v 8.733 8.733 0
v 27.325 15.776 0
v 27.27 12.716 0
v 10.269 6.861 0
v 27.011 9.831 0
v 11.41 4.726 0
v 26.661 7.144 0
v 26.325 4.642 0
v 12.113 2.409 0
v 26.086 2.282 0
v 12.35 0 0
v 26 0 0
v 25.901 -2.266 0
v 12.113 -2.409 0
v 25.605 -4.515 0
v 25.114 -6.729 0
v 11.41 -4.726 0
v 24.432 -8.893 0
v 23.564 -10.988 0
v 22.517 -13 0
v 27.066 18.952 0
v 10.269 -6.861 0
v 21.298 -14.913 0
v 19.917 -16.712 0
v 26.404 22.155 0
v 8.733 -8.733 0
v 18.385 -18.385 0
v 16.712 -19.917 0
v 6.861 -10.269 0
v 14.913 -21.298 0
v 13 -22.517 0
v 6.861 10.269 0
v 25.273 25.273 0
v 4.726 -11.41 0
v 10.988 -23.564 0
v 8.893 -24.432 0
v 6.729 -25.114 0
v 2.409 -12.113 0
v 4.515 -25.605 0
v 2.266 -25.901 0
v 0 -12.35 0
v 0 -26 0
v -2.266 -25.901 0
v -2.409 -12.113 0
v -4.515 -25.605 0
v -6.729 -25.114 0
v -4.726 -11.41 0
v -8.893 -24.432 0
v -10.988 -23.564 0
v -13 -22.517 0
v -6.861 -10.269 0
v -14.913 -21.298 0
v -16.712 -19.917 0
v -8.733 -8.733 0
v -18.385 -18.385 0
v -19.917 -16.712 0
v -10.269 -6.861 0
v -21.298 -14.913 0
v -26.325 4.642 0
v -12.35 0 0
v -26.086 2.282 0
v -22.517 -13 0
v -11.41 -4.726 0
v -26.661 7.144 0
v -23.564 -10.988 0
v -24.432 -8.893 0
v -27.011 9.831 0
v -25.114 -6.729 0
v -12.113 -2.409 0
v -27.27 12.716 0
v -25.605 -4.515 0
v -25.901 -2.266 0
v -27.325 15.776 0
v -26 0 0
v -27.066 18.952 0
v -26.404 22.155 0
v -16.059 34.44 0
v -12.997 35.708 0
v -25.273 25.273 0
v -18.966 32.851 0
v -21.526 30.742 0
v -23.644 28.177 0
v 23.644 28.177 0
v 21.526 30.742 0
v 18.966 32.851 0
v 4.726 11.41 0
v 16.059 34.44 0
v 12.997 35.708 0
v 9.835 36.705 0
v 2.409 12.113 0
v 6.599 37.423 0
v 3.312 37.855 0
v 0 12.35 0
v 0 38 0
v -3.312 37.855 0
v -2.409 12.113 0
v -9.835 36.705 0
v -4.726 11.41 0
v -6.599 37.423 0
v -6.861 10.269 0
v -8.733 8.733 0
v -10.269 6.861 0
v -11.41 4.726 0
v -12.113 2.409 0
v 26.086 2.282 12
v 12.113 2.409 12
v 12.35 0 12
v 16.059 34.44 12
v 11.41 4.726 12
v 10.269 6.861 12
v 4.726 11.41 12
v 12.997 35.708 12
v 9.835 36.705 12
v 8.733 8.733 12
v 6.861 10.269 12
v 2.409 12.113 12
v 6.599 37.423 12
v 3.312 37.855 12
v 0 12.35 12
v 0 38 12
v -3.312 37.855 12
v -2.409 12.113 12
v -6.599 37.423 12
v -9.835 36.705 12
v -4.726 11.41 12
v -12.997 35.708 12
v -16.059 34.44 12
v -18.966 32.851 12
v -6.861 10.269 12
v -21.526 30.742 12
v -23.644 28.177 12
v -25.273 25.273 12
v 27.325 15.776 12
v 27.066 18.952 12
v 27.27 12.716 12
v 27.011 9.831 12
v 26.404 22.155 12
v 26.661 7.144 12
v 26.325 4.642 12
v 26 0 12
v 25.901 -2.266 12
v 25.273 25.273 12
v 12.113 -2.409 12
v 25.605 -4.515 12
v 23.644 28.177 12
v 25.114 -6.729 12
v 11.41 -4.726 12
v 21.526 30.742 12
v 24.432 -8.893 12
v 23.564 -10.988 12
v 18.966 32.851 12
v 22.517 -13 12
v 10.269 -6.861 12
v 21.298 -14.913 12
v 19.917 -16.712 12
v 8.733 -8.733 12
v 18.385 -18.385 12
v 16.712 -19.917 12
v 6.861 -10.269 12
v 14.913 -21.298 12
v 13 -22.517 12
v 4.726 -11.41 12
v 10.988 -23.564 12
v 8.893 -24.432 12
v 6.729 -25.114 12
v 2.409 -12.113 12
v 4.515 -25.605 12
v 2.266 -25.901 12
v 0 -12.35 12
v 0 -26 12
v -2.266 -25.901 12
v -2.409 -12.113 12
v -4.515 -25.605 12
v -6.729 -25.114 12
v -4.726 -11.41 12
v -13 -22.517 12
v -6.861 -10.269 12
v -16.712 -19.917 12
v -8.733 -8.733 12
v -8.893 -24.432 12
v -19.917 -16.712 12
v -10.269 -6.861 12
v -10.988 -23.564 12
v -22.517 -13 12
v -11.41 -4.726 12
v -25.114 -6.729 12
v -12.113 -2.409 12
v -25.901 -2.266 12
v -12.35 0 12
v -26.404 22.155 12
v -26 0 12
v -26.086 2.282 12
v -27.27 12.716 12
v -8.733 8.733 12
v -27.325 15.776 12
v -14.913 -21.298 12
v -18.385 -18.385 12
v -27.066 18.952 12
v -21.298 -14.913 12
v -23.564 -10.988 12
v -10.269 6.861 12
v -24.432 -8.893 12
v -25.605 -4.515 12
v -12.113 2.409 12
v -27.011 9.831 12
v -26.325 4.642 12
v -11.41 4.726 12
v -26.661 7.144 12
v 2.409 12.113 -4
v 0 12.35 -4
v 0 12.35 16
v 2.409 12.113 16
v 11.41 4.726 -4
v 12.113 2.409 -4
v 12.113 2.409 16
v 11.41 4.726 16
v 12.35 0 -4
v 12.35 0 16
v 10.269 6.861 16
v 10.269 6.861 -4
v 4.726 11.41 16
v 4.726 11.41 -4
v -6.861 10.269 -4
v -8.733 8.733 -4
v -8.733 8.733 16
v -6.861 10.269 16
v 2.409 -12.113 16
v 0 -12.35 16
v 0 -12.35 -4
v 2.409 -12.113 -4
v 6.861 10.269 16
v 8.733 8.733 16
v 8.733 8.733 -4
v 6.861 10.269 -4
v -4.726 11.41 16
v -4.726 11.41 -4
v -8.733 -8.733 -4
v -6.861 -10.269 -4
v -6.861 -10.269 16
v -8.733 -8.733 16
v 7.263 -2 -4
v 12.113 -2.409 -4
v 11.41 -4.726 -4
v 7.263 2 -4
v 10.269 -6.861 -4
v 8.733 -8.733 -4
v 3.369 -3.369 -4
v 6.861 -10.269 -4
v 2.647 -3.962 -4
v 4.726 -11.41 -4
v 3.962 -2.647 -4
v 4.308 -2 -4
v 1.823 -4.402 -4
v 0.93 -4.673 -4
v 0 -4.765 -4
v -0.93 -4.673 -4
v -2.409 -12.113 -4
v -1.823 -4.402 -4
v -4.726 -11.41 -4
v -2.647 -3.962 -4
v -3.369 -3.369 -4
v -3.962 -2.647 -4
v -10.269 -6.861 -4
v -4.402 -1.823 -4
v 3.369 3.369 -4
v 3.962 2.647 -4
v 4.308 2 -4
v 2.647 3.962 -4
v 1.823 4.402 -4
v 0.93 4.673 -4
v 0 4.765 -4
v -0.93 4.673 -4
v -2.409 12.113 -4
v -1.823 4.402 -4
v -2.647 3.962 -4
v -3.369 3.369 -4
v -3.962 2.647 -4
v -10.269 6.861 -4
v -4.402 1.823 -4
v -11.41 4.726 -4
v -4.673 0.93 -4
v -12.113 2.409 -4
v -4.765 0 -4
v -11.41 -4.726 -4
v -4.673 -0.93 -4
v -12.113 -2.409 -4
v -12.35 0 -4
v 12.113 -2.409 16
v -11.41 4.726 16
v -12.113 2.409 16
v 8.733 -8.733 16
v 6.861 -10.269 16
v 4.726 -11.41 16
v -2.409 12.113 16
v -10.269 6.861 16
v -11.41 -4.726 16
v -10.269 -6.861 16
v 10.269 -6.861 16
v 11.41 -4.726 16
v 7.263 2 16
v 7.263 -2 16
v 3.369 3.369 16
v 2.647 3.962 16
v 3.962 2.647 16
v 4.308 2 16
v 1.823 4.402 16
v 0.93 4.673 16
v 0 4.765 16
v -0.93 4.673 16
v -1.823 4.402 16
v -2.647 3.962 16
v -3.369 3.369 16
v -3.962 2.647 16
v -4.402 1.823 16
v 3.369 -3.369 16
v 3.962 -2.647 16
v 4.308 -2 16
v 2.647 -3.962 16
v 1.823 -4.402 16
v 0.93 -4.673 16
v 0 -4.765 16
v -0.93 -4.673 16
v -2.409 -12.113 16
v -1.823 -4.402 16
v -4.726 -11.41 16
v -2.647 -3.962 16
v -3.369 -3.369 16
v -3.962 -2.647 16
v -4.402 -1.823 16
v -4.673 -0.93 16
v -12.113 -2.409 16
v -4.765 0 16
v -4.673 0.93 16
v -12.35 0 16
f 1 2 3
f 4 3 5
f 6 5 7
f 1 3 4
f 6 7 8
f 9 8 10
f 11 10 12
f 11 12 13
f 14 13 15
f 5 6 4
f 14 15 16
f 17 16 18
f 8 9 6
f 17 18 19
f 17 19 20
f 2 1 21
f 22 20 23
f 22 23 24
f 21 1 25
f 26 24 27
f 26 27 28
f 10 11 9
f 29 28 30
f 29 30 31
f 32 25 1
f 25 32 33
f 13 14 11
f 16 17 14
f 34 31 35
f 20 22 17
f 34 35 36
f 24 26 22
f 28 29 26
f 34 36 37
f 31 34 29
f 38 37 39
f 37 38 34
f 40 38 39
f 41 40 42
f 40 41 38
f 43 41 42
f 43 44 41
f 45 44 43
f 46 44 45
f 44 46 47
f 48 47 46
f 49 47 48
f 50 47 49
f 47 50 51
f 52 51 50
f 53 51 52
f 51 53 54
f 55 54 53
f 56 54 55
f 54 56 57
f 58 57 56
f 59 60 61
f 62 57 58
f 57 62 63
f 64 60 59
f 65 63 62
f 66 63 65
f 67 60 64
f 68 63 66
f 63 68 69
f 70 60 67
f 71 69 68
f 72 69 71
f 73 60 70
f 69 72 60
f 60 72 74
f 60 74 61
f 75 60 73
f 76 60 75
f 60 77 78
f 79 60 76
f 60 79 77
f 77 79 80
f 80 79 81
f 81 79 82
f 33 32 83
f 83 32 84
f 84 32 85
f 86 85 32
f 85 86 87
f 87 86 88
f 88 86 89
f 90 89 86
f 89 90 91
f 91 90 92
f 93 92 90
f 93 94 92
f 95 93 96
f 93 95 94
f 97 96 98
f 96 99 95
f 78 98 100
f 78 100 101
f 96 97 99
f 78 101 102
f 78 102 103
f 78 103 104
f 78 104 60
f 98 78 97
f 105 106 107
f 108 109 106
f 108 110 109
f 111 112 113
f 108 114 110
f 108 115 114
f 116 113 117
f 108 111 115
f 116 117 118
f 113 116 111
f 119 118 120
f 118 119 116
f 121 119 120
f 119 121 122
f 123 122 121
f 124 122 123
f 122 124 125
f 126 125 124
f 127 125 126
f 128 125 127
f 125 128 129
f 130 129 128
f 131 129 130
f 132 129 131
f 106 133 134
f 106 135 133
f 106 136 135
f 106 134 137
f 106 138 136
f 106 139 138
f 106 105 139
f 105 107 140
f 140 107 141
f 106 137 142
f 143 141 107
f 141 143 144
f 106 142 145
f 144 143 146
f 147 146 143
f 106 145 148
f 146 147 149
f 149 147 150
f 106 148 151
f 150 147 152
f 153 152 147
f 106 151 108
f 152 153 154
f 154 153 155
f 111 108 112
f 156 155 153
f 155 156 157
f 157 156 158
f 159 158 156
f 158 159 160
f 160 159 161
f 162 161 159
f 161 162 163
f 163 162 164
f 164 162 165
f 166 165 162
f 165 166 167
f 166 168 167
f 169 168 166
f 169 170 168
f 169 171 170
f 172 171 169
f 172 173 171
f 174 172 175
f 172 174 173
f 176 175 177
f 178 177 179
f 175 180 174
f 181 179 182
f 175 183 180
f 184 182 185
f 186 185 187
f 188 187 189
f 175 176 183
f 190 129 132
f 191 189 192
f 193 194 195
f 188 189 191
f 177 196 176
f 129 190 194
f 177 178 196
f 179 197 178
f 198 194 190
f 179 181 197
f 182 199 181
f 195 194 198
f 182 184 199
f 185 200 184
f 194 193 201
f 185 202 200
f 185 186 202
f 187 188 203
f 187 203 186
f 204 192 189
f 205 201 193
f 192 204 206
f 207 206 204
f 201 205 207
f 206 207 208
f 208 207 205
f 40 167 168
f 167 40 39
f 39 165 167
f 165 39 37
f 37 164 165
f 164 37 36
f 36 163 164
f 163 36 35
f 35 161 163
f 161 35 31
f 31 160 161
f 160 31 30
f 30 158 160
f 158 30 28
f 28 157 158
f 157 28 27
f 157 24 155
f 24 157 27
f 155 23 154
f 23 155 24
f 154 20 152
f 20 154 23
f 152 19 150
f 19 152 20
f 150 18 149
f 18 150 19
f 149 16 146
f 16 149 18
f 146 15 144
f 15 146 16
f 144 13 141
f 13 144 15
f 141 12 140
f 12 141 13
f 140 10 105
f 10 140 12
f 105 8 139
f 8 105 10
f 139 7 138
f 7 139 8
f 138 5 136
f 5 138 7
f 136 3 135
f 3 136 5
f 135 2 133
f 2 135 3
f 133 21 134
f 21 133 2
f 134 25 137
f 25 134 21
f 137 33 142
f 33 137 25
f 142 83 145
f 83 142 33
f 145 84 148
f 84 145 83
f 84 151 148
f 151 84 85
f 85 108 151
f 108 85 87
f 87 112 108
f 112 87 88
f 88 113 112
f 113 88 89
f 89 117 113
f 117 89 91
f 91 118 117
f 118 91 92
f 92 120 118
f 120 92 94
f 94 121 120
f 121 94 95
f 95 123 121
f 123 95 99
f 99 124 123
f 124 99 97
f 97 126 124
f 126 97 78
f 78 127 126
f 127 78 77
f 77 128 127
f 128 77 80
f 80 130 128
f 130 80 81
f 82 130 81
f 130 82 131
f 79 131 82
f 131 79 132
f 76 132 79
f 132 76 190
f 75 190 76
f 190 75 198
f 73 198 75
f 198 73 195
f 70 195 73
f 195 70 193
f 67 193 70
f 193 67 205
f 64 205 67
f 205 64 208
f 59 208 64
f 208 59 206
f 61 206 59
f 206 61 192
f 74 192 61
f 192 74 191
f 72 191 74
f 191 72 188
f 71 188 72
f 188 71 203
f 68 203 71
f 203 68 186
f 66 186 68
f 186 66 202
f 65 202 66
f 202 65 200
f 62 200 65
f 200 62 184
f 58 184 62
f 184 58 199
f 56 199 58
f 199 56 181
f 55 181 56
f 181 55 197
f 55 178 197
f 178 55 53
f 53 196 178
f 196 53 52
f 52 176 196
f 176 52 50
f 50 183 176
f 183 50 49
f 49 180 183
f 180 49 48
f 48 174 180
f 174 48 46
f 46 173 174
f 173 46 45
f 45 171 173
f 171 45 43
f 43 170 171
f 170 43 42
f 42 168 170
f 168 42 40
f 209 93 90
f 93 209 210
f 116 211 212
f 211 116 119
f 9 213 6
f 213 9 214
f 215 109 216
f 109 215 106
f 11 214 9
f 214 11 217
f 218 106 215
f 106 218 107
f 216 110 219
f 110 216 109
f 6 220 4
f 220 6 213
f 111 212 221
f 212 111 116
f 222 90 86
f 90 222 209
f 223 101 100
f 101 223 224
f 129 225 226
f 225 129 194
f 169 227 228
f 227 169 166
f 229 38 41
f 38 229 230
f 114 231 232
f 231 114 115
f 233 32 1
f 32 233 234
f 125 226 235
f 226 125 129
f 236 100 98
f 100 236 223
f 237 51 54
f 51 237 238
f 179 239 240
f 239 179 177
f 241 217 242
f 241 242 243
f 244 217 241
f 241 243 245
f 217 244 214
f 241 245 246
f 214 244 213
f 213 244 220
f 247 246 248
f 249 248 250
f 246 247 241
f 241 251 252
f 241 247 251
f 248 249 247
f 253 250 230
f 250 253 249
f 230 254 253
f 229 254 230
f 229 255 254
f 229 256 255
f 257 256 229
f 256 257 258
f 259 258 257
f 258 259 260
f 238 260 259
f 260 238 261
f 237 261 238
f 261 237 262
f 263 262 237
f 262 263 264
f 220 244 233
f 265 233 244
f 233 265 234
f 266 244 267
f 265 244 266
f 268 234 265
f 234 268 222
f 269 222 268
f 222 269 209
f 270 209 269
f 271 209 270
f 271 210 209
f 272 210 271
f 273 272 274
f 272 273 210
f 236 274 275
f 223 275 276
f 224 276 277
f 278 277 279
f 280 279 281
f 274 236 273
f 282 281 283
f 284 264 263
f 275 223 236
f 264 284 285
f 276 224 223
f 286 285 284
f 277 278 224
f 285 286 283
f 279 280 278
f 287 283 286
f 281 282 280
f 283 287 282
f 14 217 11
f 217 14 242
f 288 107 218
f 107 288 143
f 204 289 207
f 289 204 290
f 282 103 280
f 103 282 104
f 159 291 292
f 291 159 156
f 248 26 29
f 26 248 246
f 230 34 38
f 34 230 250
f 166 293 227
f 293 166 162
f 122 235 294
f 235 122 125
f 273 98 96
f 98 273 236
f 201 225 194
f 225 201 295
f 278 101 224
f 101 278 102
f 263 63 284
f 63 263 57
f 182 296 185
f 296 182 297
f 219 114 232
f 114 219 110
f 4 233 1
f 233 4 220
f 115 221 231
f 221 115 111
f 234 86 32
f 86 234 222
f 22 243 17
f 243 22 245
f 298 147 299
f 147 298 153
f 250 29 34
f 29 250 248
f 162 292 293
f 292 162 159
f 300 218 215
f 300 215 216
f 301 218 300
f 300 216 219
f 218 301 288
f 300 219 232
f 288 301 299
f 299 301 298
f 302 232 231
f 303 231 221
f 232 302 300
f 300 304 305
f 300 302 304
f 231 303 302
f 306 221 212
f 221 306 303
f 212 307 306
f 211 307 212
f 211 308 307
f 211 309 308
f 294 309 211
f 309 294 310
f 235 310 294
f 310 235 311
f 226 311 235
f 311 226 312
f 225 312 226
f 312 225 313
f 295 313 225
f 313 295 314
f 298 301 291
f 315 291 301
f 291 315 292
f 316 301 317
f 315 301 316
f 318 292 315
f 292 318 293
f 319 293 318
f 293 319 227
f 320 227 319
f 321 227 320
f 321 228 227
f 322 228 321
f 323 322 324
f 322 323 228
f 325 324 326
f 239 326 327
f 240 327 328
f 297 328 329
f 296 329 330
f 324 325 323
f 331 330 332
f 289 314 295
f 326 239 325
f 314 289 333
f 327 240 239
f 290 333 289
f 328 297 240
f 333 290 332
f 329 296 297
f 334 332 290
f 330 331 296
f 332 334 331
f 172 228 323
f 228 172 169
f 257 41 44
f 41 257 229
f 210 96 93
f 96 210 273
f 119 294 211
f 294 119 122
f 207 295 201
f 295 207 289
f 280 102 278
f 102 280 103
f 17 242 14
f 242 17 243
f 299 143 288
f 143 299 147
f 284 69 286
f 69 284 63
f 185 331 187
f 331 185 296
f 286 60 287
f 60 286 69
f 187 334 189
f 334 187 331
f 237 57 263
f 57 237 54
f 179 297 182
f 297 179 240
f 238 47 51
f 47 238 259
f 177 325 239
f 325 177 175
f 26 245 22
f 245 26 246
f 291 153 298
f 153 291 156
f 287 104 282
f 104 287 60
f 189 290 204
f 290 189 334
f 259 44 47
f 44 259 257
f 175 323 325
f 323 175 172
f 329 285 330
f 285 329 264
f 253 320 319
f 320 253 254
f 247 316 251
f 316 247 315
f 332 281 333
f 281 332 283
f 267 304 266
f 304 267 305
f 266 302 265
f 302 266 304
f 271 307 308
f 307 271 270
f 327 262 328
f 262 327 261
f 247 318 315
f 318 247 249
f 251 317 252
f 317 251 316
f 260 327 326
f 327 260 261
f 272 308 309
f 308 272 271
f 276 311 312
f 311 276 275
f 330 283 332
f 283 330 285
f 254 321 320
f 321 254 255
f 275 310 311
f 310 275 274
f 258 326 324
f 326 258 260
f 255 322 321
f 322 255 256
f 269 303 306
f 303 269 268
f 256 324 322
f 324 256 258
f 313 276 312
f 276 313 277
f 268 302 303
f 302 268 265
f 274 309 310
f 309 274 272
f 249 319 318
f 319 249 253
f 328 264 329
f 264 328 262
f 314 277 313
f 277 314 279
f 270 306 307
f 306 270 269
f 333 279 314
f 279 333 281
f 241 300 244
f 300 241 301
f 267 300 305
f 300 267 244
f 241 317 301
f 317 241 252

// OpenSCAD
$fn = 32;

// ----------------------------------------------------------------------
// Cam: base radius 26 mm with a 12 mm lift over 180 degrees
// ----------------------------------------------------------------------

// --- parameters (mm) ---
base_r = 26;              // base radius
lift = 12;                // lift height above the base radius
lift_span = 180;          // angular width of the lift
lift_start = 0;           // angle where the lift starts
cam_t = 12;               // cam plate thickness
hub_d = 24.7;             // hub diameter
hub_h = 20;               // hub height
bore_d = 9.53;            // bore
key_w = 4;                // keyway width
key_depth = 2;            // keyway depth

cam_profile = [[26, 0], [26.086, 2.282], [26.325, 4.642], [26.661, 7.144], [27.011, 9.831], [27.27, 12.716], [27.325, 15.776], [27.066, 18.952], [26.404, 22.155], [25.273, 25.273], [23.644, 28.177], [21.526, 30.742], [18.966, 32.851], [16.059, 34.44], [12.997, 35.708], [9.835, 36.705], [6.599, 37.423], [3.312, 37.855], [0, 38], [-3.312, 37.855], [-6.599, 37.423], [-9.835, 36.705], [-12.997, 35.708], [-16.059, 34.44], [-18.966, 32.851], [-21.526, 30.742], [-23.644, 28.177], [-25.273, 25.273], [-26.404, 22.155], [-27.066, 18.952], [-27.325, 15.776], [-27.27, 12.716], [-27.011, 9.831], [-26.661, 7.144], [-26.325, 4.642], [-26.086, 2.282], [-26, 0], [-25.901, -2.266], [-25.605, -4.515], [-25.114, -6.729], [-24.432, -8.893], [-23.564, -10.988], [-22.517, -13], [-21.298, -14.913], [-19.917, -16.712], [-18.385, -18.385], [-16.712, -19.917], [-14.913, -21.298], [-13, -22.517], [-10.988, -23.564], [-8.893, -24.432], [-6.729, -25.114], [-4.515, -25.605], [-2.266, -25.901], [0, -26], [2.266, -25.901], [4.515, -25.605], [6.729, -25.114], [8.893, -24.432], [10.988, -23.564], [13, -22.517], [14.913, -21.298], [16.712, -19.917], [18.385, -18.385], [19.917, -16.712], [21.298, -14.913], [22.517, -13], [23.564, -10.988], [24.432, -8.893], [25.114, -6.729], [25.605, -4.515], [25.901, -2.266]];

difference() {
  union() {
    linear_extrude(height = cam_t) polygon(cam_profile);
    /* hub, proud of the cam plate on both sides */
    translate([0, 0, -4]) cylinder(h = hub_h, d = hub_d);
  }
  /* bore through the hub, 2.5 mm clear on both faces */
  translate([0, 0, -6.5]) cylinder(h = hub_h + 5, d = bore_d);
  /* keyway, milled through the whole hub */
  translate([2.763, -2, -6.5]) cube([4.5, 4, 25]);
}
